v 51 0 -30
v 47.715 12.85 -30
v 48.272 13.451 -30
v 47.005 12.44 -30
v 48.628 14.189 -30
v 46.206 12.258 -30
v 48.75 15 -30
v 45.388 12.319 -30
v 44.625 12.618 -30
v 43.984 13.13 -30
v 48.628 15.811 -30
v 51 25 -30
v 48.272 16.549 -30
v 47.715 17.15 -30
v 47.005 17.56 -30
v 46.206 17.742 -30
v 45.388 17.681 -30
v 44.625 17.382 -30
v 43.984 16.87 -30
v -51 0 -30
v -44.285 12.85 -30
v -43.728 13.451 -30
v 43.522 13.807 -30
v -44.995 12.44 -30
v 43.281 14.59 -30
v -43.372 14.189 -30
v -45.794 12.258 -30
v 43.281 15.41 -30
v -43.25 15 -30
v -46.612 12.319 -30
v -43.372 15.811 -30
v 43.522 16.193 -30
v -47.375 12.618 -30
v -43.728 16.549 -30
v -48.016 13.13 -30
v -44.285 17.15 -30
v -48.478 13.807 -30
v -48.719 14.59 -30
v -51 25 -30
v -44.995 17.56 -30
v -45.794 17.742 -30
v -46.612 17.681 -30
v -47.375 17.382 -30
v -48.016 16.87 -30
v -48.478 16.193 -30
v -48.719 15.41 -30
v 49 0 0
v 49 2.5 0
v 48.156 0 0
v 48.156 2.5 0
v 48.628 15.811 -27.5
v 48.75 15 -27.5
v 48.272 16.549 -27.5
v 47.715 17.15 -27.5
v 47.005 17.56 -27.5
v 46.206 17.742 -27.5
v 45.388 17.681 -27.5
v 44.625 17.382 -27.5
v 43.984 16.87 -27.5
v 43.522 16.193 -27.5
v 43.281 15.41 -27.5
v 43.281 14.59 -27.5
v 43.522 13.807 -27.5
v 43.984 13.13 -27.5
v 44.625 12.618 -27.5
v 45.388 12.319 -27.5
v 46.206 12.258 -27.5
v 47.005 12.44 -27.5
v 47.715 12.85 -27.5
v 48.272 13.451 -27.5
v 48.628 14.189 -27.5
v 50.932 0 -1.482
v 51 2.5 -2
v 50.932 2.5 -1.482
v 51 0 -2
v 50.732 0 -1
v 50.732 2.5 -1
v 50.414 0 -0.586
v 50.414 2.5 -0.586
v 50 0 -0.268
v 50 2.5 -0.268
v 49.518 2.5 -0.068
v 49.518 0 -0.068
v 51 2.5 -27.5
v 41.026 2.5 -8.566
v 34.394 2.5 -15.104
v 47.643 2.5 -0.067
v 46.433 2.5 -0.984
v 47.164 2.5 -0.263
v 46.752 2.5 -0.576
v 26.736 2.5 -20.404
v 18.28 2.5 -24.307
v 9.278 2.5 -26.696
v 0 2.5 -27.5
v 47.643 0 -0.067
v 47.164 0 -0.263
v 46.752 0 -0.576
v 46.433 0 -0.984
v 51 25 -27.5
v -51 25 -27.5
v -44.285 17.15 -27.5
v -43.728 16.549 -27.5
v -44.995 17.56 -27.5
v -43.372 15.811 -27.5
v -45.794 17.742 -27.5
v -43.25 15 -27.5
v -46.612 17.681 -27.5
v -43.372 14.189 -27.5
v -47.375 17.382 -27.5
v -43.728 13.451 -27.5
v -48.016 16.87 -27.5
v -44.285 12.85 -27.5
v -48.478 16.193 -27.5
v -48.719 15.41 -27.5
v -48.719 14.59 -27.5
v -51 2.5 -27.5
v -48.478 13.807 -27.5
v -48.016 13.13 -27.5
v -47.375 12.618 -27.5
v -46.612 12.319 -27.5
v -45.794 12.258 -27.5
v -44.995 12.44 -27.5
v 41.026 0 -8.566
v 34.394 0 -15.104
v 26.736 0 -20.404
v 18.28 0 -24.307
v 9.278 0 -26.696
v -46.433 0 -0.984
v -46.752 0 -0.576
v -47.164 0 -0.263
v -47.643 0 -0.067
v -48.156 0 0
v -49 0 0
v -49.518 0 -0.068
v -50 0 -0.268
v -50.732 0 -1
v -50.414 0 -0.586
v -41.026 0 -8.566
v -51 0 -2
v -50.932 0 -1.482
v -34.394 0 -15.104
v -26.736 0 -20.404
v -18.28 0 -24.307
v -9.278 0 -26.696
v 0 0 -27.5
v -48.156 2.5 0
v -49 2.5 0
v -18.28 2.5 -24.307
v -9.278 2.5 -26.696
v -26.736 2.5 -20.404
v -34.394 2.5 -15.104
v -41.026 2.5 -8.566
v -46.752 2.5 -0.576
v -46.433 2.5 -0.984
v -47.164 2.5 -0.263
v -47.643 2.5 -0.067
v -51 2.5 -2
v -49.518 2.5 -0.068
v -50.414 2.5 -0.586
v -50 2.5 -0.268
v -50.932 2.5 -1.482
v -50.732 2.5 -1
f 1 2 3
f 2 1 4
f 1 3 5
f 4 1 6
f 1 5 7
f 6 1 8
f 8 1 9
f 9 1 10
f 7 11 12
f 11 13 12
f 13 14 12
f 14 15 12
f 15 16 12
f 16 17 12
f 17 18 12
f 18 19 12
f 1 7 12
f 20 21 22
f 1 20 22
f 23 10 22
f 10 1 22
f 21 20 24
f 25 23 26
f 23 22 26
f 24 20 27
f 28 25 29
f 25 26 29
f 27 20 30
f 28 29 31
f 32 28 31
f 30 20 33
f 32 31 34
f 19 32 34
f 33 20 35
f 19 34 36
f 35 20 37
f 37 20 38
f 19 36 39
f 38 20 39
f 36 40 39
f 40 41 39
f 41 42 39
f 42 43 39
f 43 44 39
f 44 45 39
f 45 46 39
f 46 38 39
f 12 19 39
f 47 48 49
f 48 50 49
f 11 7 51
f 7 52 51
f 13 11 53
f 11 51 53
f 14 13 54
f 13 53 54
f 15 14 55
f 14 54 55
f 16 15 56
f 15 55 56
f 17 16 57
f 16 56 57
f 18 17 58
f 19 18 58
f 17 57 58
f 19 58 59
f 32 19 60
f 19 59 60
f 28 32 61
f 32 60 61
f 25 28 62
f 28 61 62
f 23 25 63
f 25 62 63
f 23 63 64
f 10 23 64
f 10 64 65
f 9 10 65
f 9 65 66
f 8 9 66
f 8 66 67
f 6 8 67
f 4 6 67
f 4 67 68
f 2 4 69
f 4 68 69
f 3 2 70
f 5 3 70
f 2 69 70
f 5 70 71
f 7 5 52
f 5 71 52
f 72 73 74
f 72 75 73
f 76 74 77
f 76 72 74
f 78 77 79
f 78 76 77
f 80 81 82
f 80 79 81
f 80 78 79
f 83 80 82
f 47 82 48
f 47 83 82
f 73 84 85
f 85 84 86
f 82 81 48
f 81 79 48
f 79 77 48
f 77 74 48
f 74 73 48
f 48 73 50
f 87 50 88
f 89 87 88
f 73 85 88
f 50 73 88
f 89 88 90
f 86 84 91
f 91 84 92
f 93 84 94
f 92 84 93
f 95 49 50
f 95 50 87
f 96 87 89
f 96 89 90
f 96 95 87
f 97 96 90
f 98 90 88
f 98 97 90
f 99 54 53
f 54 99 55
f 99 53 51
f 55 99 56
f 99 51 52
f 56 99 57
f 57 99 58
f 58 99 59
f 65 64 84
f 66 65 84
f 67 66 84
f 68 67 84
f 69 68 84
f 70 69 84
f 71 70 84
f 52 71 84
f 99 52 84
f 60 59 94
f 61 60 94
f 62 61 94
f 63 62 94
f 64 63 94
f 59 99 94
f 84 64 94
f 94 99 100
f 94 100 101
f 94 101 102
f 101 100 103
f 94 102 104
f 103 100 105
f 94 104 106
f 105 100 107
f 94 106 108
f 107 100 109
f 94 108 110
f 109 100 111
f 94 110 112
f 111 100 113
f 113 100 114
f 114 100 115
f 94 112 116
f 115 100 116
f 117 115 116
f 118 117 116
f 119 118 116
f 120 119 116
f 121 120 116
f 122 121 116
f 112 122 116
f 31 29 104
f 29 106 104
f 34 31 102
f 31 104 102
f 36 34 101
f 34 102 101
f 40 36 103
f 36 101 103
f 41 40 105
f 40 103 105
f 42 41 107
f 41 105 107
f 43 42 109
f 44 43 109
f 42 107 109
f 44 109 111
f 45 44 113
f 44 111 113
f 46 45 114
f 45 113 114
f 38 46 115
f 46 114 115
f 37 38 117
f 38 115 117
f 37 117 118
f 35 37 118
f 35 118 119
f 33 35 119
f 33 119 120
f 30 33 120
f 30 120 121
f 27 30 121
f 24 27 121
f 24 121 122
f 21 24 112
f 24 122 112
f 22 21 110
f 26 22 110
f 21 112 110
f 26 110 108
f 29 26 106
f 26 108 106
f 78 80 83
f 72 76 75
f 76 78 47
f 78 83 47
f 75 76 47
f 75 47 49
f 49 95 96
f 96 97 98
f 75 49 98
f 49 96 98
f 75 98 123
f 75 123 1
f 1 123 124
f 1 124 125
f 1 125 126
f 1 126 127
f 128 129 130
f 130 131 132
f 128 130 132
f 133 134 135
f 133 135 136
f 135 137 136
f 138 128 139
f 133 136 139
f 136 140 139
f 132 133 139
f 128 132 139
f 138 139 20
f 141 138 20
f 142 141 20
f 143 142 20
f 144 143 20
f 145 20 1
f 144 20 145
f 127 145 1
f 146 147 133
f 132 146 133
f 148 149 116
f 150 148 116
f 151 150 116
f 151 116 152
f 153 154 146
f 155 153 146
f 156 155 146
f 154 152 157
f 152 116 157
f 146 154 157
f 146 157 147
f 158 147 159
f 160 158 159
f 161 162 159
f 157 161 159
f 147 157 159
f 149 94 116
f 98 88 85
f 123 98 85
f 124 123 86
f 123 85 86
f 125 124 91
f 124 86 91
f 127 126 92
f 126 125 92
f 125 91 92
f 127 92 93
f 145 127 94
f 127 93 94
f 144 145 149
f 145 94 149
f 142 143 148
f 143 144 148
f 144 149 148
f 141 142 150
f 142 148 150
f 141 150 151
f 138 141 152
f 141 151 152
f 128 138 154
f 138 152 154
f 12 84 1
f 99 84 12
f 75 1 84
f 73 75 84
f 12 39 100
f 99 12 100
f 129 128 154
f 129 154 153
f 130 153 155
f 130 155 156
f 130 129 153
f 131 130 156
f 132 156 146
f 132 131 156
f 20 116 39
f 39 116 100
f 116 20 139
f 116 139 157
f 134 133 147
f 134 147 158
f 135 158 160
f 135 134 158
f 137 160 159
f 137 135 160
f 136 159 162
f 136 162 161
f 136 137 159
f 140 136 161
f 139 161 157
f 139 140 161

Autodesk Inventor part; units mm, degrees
ref_plane "YZ Plane" through (0, 0, 0) normal (1, 0, 0) x (0, 1, 0)
ref_plane "XZ Plane" through (0, 0, 0) normal (0, 1, 0) x (-1, 0, 0)
ref_plane "XY Plane" through (0, 0, 0) normal (0, 0, 1) x (1, 0, 0)
sketch "Skizze1" plane through (0, 0, 0) normal (1, 0, 0) x (0, 1, 0)
  line L0 (0, 0) -> (0, -30)
  line L1 (0, -30) -> (25, -30)
  line L2 (25, -30) -> (25, -27.5)
  line L3 (25, -27.5) -> (2.5, -27.5)
  line L4 (2.5, -27.5) -> (2.5, 0)
  line L5 (2.5, 0) -> (0, 0)
  dimension "d0" = 30
  dimension "d1" = 25
  dimension "d2" = 2.5
  dimension "d3" = 22.5
extrude "Extrusion1" add sketch "Skizze1" along normal mid plane 102
sketch "Skizze2" plane through (-51, 2.5, 0) normal (0, 1, 0) x (1, 0, 0)
  line L0 (0, 0) -> (102, 0) projected
  arc A0 (98, 0) -> (4, 0) centre (51, -26.4136) ccw
  line L1 (0, 27.5) -> (102, 27.5) projected
  line L2 (4, 0) -> (98, 0)
  point P0 (51, 0)
  dimension "d6" = 94
extrude "Extrusion2" cut sketch "Skizze2" against normal blind 2.5
fillet "Rundung1" radius 2 4 edges at (47, 1.25, 0) (-47, 1.25, 0) (-51, 1.25, 0) (51, 1.25, 0)
sketch "Skizze3" plane through (-51, 2.5, -27.5) normal (0, 1, 0) x (1, 0, 0)
  line L0 (-0.5, 0) -> (27.5, 0) construction
  line L1 (-0.5, -28) -> (4.5665, -28)
  arc A0 (97.4335, -28) -> (4.5665, -28) centre (51, -53.8505) ccw
  line L2 (102.2546, -28) -> (97.4335, -28)
  line L3 (51, 0) -> (102, 0) projected
  line L4 (-0.5, -28) -> (-0.5, -23)
  arc A1 (51, 0) -> (-0.5, -23) centre (49.8083, -66.4893) ccw
  line L5 (102.2546, -28) -> (102.2546, -23)
  line L6 (102, 0) -> (102, -25.5) projected
  line L7 (102.2546, -28) -> (107.2546, -28) construction
  arc A2 (97.4335, -26.5163) -> (51, 0) centre (51, -53.9136) ccw projected
  arc A3 (102.2546, -23) -> (51, 0) centre (51.9496, -66.4932) ccw
  point P0 (51, -27.5)
  dimension "d10" = 28
  dimension "d13" = 5
  dimension "d14" = 66.5
  dimension "d20" = 5
  dimension "d21" = 90
  dimension "d22" = 66.5
extrude "Extrusion3" [suppressed]
fillet "Rundung2" [suppressed]
sketch "Skizze4" plane through (-51, 25, -27.5) normal (0, 0, 1) x (1, 0, 0)
  circle A0 centre (97, -10) radius 2.75
  circle A1 centre (5, -10) radius 2.75
  point P0 (51, -25)
  dimension "d24" = 5.5
  dimension "d25" = 5.5
extrude "Extrusion4" cut sketch "Skizze4" against normal blind 2.5
properties part number "Glashalter"
